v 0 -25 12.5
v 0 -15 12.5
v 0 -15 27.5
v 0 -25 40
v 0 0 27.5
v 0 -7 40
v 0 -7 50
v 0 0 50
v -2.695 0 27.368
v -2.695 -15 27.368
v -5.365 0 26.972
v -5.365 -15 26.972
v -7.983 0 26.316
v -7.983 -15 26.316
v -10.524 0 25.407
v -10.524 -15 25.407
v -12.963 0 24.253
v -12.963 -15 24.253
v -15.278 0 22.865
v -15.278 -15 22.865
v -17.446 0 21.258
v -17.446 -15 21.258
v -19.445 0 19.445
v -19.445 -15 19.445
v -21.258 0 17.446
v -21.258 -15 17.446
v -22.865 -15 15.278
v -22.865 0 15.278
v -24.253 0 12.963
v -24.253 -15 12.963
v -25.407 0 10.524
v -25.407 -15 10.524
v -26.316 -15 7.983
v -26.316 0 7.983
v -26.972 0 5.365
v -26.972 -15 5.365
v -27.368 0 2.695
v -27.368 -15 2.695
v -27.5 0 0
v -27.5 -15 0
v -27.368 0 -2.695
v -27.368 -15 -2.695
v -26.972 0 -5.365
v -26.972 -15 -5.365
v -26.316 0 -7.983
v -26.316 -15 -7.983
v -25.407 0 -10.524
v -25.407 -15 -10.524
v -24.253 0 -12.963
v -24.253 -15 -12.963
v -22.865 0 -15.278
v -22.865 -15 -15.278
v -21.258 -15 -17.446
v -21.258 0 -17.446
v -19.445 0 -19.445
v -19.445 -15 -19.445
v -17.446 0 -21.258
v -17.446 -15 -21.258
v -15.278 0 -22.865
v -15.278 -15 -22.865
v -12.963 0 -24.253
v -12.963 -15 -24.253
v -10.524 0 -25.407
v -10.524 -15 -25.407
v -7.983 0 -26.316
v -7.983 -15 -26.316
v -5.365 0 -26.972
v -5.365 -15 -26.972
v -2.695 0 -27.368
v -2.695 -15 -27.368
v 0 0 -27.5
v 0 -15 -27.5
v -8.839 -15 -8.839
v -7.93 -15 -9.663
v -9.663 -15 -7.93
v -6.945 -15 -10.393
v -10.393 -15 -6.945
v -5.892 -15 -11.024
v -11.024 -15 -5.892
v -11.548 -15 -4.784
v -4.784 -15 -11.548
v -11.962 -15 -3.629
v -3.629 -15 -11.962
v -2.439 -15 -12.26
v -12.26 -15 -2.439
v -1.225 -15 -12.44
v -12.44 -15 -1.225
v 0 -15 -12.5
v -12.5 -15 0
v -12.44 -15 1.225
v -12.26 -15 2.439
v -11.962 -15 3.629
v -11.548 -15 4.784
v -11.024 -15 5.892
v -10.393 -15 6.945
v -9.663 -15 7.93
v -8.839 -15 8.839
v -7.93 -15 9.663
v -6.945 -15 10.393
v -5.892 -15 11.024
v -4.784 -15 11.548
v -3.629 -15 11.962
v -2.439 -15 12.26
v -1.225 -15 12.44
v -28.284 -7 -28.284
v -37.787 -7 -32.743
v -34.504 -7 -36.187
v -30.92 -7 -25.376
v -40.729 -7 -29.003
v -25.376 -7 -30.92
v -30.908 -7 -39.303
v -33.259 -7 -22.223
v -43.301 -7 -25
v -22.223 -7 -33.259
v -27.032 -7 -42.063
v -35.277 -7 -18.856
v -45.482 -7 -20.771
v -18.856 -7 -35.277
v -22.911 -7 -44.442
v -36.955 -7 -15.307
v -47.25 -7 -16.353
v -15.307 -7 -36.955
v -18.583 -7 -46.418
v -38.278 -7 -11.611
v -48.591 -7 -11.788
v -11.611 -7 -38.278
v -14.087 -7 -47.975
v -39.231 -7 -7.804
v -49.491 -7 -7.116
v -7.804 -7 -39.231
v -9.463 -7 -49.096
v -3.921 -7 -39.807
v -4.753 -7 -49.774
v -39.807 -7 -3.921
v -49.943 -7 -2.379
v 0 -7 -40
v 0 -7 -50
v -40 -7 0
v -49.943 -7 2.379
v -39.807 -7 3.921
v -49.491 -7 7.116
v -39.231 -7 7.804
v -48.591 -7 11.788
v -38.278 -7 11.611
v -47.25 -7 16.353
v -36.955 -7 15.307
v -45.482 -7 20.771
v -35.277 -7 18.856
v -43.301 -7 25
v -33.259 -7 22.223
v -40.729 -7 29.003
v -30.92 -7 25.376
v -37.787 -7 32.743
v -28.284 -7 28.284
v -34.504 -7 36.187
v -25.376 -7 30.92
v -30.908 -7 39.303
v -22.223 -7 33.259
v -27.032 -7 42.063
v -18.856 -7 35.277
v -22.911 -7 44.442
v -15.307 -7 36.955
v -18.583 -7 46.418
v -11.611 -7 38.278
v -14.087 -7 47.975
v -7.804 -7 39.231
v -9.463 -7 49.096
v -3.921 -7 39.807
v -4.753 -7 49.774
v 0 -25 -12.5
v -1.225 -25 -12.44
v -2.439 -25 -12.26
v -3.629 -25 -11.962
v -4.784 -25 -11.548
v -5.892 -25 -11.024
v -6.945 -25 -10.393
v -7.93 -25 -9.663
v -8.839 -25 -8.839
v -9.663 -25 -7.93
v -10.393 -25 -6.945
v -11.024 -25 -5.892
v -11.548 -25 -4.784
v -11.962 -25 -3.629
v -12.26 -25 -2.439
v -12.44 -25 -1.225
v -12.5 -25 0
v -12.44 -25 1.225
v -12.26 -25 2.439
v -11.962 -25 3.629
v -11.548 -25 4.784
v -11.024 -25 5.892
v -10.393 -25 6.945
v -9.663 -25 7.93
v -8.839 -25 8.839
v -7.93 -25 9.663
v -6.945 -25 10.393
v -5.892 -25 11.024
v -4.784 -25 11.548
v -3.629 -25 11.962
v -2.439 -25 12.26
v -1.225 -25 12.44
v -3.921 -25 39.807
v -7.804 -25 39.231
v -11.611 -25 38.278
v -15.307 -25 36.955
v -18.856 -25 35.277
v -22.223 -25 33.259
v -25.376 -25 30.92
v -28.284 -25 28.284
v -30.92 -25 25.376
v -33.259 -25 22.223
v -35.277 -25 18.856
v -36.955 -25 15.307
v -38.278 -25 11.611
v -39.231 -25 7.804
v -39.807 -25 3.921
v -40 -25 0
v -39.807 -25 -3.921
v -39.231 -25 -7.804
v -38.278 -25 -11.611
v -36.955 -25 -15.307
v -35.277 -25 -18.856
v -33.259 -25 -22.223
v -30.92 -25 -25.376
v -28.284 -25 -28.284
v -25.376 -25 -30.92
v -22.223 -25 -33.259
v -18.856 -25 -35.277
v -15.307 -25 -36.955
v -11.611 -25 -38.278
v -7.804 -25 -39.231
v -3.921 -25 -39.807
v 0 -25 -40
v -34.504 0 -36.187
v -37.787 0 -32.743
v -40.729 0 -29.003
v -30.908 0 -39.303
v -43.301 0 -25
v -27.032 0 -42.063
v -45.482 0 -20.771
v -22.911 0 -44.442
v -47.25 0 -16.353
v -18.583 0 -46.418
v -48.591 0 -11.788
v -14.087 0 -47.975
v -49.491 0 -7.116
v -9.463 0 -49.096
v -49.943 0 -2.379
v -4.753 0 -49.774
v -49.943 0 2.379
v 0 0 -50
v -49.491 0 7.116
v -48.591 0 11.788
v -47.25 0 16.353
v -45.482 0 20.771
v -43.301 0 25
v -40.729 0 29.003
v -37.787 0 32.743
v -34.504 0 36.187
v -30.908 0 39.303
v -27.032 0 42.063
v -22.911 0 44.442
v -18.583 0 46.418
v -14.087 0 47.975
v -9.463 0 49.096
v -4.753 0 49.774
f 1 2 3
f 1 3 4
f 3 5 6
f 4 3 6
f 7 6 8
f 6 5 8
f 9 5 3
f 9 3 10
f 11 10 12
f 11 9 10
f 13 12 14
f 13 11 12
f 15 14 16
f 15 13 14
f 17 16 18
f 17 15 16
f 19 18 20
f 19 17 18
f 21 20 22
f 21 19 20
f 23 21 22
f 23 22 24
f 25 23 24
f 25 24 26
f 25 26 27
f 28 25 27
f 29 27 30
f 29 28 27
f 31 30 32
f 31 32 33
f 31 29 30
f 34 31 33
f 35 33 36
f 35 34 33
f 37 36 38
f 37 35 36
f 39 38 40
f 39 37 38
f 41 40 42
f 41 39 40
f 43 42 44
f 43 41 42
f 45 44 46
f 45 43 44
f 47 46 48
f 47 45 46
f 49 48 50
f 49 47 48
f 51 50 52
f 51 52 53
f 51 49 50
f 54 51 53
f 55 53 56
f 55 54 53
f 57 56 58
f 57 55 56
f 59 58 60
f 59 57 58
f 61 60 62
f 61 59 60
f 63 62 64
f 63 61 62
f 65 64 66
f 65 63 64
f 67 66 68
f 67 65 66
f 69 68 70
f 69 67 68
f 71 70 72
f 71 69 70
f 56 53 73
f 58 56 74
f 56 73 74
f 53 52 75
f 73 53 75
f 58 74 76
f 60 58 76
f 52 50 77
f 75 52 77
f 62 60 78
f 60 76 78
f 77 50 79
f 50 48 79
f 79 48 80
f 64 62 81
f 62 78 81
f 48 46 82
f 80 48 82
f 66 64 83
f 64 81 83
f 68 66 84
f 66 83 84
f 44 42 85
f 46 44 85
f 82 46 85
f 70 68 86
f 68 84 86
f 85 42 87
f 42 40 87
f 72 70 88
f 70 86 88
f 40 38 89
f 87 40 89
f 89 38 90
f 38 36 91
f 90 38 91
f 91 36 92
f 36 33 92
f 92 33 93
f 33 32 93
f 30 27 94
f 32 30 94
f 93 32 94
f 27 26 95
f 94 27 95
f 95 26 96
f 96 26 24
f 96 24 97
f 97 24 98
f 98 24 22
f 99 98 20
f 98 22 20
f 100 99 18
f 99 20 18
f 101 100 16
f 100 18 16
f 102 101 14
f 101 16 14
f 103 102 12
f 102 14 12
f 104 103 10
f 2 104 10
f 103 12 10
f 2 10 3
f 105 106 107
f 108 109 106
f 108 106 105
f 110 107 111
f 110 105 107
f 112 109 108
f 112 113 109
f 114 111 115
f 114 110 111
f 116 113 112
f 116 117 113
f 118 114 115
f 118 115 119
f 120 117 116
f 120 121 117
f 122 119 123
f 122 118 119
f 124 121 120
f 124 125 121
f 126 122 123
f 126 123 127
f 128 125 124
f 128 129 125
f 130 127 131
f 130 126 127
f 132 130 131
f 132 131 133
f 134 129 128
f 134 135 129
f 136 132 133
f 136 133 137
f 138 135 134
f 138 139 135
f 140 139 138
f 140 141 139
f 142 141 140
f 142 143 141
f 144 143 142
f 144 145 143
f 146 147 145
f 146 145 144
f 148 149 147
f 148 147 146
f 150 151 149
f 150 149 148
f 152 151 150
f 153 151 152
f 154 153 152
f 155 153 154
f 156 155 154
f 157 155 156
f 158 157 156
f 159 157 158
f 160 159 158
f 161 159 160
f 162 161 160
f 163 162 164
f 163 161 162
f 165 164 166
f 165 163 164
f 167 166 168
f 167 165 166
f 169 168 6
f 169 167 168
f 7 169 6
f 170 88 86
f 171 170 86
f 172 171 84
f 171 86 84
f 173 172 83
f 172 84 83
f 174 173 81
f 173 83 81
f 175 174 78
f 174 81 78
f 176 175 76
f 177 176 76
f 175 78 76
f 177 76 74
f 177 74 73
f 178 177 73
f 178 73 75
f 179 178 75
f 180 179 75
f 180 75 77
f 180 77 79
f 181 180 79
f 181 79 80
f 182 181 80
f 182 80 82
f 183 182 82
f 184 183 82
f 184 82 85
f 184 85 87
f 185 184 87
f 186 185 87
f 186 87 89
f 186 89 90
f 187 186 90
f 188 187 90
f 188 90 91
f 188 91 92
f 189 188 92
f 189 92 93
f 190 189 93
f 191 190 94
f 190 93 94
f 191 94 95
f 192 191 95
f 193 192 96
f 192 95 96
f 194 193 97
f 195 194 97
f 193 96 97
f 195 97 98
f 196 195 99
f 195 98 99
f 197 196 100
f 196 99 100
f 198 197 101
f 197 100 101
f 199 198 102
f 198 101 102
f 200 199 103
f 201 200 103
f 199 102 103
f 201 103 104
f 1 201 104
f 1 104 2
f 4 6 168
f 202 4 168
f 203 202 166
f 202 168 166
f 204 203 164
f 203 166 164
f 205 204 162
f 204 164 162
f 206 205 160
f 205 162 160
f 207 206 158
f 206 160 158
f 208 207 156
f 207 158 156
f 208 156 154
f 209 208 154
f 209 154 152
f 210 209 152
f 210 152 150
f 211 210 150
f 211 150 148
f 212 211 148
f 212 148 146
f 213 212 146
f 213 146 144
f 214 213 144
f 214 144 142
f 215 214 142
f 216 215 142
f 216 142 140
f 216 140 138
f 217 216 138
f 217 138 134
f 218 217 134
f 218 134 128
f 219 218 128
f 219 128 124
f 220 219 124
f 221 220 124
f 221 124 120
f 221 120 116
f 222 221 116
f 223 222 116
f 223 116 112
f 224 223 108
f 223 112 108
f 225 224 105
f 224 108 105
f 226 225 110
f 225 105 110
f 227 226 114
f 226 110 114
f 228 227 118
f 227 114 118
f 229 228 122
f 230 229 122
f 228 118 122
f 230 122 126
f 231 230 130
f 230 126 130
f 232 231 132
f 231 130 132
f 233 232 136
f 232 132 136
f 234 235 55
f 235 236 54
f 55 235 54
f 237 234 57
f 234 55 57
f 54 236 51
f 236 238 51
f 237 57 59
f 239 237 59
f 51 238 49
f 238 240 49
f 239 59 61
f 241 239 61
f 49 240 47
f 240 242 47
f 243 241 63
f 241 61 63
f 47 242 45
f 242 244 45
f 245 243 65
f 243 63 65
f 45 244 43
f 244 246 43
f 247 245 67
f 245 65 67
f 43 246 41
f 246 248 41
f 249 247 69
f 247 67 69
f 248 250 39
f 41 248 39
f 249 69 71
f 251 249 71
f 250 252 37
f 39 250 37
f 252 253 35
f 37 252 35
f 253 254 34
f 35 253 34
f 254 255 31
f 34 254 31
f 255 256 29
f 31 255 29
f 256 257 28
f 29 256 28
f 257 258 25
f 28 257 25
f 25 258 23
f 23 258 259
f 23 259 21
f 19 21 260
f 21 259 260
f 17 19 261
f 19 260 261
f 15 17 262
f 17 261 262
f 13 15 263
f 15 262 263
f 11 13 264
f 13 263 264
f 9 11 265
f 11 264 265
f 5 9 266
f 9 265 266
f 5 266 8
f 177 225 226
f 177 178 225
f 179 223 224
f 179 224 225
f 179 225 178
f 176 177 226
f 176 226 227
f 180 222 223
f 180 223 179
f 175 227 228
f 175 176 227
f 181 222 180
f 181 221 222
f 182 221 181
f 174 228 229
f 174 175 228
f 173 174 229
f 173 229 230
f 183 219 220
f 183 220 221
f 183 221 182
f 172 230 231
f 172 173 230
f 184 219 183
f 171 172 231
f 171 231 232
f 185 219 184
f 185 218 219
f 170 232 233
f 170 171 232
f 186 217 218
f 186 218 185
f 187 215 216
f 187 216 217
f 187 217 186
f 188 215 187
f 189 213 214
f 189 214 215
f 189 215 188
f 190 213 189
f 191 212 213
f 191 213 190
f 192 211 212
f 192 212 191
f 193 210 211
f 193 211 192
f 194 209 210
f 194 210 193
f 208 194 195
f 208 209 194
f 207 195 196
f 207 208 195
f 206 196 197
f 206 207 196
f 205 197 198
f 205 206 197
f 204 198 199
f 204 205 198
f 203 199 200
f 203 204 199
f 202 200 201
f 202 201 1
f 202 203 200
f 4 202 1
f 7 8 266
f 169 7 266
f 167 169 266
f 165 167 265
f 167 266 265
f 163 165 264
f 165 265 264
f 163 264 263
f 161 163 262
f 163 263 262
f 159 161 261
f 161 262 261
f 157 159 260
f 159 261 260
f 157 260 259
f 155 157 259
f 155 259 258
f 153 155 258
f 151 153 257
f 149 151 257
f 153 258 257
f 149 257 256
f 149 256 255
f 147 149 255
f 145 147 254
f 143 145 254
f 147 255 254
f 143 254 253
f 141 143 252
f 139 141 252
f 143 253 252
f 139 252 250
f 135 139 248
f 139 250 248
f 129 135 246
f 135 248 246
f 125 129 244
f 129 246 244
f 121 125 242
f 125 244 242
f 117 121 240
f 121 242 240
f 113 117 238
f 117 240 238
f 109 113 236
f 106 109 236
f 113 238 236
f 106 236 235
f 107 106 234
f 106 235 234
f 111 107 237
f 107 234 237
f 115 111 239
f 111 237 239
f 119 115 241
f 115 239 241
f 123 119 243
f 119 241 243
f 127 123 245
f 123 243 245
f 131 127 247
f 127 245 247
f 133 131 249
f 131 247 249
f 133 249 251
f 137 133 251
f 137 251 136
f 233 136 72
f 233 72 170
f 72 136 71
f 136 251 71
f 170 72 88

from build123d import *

# Parameters (mm, degrees)
F1_DEPTH = 25
F2_DEPTH = 7
F3_DEPTH = 15


with BuildPart() as f1:
    # F0 (on Front) → F1 (new body)
    with BuildSketch(Plane.XZ):
        with BuildLine():
            Line((0, 27.5), (0, 40))
            ThreePointArc((0, 40), (-40, 0), (0, -40))
            Line((0, -40), (0, -27.5))
            ThreePointArc((0, -27.5), (-27.5, 0), (0, 27.5))
        make_face()
        with BuildLine():
            Line((0, 12.5), (0, 27.5))
            ThreePointArc((0, 27.5), (-27.5, 0), (0, -27.5))
            Line((0, -27.5), (0, -12.5))
            ThreePointArc((0, -12.5), (-12.5, 0), (0, 12.5))
        make_face()
    extrude(amount=F1_DEPTH)

    # F0 (on Front) → F2 (join)
    with BuildSketch(Plane.XZ):
        with BuildLine():
            ThreePointArc((0, -40), (-40, 0), (0, 40))
            Line((0, 40), (0, 50))
            ThreePointArc((0, 50), (-50, 0), (0, -50))
            Line((0, -50), (0, -40))
        make_face()
    extrude(amount=F2_DEPTH)

    # F0 (on Front) → F3 (cut)
    with BuildSketch(Plane.XZ):
        with BuildLine():
            Line((0, 12.5), (0, 27.5))
            ThreePointArc((0, 27.5), (-27.5, 0), (0, -27.5))
            Line((0, -27.5), (0, -12.5))
            ThreePointArc((0, -12.5), (-12.5, 0), (0, 12.5))
        make_face()
    extrude(amount=F3_DEPTH, mode=Mode.SUBTRACT)


solid = f1.part
